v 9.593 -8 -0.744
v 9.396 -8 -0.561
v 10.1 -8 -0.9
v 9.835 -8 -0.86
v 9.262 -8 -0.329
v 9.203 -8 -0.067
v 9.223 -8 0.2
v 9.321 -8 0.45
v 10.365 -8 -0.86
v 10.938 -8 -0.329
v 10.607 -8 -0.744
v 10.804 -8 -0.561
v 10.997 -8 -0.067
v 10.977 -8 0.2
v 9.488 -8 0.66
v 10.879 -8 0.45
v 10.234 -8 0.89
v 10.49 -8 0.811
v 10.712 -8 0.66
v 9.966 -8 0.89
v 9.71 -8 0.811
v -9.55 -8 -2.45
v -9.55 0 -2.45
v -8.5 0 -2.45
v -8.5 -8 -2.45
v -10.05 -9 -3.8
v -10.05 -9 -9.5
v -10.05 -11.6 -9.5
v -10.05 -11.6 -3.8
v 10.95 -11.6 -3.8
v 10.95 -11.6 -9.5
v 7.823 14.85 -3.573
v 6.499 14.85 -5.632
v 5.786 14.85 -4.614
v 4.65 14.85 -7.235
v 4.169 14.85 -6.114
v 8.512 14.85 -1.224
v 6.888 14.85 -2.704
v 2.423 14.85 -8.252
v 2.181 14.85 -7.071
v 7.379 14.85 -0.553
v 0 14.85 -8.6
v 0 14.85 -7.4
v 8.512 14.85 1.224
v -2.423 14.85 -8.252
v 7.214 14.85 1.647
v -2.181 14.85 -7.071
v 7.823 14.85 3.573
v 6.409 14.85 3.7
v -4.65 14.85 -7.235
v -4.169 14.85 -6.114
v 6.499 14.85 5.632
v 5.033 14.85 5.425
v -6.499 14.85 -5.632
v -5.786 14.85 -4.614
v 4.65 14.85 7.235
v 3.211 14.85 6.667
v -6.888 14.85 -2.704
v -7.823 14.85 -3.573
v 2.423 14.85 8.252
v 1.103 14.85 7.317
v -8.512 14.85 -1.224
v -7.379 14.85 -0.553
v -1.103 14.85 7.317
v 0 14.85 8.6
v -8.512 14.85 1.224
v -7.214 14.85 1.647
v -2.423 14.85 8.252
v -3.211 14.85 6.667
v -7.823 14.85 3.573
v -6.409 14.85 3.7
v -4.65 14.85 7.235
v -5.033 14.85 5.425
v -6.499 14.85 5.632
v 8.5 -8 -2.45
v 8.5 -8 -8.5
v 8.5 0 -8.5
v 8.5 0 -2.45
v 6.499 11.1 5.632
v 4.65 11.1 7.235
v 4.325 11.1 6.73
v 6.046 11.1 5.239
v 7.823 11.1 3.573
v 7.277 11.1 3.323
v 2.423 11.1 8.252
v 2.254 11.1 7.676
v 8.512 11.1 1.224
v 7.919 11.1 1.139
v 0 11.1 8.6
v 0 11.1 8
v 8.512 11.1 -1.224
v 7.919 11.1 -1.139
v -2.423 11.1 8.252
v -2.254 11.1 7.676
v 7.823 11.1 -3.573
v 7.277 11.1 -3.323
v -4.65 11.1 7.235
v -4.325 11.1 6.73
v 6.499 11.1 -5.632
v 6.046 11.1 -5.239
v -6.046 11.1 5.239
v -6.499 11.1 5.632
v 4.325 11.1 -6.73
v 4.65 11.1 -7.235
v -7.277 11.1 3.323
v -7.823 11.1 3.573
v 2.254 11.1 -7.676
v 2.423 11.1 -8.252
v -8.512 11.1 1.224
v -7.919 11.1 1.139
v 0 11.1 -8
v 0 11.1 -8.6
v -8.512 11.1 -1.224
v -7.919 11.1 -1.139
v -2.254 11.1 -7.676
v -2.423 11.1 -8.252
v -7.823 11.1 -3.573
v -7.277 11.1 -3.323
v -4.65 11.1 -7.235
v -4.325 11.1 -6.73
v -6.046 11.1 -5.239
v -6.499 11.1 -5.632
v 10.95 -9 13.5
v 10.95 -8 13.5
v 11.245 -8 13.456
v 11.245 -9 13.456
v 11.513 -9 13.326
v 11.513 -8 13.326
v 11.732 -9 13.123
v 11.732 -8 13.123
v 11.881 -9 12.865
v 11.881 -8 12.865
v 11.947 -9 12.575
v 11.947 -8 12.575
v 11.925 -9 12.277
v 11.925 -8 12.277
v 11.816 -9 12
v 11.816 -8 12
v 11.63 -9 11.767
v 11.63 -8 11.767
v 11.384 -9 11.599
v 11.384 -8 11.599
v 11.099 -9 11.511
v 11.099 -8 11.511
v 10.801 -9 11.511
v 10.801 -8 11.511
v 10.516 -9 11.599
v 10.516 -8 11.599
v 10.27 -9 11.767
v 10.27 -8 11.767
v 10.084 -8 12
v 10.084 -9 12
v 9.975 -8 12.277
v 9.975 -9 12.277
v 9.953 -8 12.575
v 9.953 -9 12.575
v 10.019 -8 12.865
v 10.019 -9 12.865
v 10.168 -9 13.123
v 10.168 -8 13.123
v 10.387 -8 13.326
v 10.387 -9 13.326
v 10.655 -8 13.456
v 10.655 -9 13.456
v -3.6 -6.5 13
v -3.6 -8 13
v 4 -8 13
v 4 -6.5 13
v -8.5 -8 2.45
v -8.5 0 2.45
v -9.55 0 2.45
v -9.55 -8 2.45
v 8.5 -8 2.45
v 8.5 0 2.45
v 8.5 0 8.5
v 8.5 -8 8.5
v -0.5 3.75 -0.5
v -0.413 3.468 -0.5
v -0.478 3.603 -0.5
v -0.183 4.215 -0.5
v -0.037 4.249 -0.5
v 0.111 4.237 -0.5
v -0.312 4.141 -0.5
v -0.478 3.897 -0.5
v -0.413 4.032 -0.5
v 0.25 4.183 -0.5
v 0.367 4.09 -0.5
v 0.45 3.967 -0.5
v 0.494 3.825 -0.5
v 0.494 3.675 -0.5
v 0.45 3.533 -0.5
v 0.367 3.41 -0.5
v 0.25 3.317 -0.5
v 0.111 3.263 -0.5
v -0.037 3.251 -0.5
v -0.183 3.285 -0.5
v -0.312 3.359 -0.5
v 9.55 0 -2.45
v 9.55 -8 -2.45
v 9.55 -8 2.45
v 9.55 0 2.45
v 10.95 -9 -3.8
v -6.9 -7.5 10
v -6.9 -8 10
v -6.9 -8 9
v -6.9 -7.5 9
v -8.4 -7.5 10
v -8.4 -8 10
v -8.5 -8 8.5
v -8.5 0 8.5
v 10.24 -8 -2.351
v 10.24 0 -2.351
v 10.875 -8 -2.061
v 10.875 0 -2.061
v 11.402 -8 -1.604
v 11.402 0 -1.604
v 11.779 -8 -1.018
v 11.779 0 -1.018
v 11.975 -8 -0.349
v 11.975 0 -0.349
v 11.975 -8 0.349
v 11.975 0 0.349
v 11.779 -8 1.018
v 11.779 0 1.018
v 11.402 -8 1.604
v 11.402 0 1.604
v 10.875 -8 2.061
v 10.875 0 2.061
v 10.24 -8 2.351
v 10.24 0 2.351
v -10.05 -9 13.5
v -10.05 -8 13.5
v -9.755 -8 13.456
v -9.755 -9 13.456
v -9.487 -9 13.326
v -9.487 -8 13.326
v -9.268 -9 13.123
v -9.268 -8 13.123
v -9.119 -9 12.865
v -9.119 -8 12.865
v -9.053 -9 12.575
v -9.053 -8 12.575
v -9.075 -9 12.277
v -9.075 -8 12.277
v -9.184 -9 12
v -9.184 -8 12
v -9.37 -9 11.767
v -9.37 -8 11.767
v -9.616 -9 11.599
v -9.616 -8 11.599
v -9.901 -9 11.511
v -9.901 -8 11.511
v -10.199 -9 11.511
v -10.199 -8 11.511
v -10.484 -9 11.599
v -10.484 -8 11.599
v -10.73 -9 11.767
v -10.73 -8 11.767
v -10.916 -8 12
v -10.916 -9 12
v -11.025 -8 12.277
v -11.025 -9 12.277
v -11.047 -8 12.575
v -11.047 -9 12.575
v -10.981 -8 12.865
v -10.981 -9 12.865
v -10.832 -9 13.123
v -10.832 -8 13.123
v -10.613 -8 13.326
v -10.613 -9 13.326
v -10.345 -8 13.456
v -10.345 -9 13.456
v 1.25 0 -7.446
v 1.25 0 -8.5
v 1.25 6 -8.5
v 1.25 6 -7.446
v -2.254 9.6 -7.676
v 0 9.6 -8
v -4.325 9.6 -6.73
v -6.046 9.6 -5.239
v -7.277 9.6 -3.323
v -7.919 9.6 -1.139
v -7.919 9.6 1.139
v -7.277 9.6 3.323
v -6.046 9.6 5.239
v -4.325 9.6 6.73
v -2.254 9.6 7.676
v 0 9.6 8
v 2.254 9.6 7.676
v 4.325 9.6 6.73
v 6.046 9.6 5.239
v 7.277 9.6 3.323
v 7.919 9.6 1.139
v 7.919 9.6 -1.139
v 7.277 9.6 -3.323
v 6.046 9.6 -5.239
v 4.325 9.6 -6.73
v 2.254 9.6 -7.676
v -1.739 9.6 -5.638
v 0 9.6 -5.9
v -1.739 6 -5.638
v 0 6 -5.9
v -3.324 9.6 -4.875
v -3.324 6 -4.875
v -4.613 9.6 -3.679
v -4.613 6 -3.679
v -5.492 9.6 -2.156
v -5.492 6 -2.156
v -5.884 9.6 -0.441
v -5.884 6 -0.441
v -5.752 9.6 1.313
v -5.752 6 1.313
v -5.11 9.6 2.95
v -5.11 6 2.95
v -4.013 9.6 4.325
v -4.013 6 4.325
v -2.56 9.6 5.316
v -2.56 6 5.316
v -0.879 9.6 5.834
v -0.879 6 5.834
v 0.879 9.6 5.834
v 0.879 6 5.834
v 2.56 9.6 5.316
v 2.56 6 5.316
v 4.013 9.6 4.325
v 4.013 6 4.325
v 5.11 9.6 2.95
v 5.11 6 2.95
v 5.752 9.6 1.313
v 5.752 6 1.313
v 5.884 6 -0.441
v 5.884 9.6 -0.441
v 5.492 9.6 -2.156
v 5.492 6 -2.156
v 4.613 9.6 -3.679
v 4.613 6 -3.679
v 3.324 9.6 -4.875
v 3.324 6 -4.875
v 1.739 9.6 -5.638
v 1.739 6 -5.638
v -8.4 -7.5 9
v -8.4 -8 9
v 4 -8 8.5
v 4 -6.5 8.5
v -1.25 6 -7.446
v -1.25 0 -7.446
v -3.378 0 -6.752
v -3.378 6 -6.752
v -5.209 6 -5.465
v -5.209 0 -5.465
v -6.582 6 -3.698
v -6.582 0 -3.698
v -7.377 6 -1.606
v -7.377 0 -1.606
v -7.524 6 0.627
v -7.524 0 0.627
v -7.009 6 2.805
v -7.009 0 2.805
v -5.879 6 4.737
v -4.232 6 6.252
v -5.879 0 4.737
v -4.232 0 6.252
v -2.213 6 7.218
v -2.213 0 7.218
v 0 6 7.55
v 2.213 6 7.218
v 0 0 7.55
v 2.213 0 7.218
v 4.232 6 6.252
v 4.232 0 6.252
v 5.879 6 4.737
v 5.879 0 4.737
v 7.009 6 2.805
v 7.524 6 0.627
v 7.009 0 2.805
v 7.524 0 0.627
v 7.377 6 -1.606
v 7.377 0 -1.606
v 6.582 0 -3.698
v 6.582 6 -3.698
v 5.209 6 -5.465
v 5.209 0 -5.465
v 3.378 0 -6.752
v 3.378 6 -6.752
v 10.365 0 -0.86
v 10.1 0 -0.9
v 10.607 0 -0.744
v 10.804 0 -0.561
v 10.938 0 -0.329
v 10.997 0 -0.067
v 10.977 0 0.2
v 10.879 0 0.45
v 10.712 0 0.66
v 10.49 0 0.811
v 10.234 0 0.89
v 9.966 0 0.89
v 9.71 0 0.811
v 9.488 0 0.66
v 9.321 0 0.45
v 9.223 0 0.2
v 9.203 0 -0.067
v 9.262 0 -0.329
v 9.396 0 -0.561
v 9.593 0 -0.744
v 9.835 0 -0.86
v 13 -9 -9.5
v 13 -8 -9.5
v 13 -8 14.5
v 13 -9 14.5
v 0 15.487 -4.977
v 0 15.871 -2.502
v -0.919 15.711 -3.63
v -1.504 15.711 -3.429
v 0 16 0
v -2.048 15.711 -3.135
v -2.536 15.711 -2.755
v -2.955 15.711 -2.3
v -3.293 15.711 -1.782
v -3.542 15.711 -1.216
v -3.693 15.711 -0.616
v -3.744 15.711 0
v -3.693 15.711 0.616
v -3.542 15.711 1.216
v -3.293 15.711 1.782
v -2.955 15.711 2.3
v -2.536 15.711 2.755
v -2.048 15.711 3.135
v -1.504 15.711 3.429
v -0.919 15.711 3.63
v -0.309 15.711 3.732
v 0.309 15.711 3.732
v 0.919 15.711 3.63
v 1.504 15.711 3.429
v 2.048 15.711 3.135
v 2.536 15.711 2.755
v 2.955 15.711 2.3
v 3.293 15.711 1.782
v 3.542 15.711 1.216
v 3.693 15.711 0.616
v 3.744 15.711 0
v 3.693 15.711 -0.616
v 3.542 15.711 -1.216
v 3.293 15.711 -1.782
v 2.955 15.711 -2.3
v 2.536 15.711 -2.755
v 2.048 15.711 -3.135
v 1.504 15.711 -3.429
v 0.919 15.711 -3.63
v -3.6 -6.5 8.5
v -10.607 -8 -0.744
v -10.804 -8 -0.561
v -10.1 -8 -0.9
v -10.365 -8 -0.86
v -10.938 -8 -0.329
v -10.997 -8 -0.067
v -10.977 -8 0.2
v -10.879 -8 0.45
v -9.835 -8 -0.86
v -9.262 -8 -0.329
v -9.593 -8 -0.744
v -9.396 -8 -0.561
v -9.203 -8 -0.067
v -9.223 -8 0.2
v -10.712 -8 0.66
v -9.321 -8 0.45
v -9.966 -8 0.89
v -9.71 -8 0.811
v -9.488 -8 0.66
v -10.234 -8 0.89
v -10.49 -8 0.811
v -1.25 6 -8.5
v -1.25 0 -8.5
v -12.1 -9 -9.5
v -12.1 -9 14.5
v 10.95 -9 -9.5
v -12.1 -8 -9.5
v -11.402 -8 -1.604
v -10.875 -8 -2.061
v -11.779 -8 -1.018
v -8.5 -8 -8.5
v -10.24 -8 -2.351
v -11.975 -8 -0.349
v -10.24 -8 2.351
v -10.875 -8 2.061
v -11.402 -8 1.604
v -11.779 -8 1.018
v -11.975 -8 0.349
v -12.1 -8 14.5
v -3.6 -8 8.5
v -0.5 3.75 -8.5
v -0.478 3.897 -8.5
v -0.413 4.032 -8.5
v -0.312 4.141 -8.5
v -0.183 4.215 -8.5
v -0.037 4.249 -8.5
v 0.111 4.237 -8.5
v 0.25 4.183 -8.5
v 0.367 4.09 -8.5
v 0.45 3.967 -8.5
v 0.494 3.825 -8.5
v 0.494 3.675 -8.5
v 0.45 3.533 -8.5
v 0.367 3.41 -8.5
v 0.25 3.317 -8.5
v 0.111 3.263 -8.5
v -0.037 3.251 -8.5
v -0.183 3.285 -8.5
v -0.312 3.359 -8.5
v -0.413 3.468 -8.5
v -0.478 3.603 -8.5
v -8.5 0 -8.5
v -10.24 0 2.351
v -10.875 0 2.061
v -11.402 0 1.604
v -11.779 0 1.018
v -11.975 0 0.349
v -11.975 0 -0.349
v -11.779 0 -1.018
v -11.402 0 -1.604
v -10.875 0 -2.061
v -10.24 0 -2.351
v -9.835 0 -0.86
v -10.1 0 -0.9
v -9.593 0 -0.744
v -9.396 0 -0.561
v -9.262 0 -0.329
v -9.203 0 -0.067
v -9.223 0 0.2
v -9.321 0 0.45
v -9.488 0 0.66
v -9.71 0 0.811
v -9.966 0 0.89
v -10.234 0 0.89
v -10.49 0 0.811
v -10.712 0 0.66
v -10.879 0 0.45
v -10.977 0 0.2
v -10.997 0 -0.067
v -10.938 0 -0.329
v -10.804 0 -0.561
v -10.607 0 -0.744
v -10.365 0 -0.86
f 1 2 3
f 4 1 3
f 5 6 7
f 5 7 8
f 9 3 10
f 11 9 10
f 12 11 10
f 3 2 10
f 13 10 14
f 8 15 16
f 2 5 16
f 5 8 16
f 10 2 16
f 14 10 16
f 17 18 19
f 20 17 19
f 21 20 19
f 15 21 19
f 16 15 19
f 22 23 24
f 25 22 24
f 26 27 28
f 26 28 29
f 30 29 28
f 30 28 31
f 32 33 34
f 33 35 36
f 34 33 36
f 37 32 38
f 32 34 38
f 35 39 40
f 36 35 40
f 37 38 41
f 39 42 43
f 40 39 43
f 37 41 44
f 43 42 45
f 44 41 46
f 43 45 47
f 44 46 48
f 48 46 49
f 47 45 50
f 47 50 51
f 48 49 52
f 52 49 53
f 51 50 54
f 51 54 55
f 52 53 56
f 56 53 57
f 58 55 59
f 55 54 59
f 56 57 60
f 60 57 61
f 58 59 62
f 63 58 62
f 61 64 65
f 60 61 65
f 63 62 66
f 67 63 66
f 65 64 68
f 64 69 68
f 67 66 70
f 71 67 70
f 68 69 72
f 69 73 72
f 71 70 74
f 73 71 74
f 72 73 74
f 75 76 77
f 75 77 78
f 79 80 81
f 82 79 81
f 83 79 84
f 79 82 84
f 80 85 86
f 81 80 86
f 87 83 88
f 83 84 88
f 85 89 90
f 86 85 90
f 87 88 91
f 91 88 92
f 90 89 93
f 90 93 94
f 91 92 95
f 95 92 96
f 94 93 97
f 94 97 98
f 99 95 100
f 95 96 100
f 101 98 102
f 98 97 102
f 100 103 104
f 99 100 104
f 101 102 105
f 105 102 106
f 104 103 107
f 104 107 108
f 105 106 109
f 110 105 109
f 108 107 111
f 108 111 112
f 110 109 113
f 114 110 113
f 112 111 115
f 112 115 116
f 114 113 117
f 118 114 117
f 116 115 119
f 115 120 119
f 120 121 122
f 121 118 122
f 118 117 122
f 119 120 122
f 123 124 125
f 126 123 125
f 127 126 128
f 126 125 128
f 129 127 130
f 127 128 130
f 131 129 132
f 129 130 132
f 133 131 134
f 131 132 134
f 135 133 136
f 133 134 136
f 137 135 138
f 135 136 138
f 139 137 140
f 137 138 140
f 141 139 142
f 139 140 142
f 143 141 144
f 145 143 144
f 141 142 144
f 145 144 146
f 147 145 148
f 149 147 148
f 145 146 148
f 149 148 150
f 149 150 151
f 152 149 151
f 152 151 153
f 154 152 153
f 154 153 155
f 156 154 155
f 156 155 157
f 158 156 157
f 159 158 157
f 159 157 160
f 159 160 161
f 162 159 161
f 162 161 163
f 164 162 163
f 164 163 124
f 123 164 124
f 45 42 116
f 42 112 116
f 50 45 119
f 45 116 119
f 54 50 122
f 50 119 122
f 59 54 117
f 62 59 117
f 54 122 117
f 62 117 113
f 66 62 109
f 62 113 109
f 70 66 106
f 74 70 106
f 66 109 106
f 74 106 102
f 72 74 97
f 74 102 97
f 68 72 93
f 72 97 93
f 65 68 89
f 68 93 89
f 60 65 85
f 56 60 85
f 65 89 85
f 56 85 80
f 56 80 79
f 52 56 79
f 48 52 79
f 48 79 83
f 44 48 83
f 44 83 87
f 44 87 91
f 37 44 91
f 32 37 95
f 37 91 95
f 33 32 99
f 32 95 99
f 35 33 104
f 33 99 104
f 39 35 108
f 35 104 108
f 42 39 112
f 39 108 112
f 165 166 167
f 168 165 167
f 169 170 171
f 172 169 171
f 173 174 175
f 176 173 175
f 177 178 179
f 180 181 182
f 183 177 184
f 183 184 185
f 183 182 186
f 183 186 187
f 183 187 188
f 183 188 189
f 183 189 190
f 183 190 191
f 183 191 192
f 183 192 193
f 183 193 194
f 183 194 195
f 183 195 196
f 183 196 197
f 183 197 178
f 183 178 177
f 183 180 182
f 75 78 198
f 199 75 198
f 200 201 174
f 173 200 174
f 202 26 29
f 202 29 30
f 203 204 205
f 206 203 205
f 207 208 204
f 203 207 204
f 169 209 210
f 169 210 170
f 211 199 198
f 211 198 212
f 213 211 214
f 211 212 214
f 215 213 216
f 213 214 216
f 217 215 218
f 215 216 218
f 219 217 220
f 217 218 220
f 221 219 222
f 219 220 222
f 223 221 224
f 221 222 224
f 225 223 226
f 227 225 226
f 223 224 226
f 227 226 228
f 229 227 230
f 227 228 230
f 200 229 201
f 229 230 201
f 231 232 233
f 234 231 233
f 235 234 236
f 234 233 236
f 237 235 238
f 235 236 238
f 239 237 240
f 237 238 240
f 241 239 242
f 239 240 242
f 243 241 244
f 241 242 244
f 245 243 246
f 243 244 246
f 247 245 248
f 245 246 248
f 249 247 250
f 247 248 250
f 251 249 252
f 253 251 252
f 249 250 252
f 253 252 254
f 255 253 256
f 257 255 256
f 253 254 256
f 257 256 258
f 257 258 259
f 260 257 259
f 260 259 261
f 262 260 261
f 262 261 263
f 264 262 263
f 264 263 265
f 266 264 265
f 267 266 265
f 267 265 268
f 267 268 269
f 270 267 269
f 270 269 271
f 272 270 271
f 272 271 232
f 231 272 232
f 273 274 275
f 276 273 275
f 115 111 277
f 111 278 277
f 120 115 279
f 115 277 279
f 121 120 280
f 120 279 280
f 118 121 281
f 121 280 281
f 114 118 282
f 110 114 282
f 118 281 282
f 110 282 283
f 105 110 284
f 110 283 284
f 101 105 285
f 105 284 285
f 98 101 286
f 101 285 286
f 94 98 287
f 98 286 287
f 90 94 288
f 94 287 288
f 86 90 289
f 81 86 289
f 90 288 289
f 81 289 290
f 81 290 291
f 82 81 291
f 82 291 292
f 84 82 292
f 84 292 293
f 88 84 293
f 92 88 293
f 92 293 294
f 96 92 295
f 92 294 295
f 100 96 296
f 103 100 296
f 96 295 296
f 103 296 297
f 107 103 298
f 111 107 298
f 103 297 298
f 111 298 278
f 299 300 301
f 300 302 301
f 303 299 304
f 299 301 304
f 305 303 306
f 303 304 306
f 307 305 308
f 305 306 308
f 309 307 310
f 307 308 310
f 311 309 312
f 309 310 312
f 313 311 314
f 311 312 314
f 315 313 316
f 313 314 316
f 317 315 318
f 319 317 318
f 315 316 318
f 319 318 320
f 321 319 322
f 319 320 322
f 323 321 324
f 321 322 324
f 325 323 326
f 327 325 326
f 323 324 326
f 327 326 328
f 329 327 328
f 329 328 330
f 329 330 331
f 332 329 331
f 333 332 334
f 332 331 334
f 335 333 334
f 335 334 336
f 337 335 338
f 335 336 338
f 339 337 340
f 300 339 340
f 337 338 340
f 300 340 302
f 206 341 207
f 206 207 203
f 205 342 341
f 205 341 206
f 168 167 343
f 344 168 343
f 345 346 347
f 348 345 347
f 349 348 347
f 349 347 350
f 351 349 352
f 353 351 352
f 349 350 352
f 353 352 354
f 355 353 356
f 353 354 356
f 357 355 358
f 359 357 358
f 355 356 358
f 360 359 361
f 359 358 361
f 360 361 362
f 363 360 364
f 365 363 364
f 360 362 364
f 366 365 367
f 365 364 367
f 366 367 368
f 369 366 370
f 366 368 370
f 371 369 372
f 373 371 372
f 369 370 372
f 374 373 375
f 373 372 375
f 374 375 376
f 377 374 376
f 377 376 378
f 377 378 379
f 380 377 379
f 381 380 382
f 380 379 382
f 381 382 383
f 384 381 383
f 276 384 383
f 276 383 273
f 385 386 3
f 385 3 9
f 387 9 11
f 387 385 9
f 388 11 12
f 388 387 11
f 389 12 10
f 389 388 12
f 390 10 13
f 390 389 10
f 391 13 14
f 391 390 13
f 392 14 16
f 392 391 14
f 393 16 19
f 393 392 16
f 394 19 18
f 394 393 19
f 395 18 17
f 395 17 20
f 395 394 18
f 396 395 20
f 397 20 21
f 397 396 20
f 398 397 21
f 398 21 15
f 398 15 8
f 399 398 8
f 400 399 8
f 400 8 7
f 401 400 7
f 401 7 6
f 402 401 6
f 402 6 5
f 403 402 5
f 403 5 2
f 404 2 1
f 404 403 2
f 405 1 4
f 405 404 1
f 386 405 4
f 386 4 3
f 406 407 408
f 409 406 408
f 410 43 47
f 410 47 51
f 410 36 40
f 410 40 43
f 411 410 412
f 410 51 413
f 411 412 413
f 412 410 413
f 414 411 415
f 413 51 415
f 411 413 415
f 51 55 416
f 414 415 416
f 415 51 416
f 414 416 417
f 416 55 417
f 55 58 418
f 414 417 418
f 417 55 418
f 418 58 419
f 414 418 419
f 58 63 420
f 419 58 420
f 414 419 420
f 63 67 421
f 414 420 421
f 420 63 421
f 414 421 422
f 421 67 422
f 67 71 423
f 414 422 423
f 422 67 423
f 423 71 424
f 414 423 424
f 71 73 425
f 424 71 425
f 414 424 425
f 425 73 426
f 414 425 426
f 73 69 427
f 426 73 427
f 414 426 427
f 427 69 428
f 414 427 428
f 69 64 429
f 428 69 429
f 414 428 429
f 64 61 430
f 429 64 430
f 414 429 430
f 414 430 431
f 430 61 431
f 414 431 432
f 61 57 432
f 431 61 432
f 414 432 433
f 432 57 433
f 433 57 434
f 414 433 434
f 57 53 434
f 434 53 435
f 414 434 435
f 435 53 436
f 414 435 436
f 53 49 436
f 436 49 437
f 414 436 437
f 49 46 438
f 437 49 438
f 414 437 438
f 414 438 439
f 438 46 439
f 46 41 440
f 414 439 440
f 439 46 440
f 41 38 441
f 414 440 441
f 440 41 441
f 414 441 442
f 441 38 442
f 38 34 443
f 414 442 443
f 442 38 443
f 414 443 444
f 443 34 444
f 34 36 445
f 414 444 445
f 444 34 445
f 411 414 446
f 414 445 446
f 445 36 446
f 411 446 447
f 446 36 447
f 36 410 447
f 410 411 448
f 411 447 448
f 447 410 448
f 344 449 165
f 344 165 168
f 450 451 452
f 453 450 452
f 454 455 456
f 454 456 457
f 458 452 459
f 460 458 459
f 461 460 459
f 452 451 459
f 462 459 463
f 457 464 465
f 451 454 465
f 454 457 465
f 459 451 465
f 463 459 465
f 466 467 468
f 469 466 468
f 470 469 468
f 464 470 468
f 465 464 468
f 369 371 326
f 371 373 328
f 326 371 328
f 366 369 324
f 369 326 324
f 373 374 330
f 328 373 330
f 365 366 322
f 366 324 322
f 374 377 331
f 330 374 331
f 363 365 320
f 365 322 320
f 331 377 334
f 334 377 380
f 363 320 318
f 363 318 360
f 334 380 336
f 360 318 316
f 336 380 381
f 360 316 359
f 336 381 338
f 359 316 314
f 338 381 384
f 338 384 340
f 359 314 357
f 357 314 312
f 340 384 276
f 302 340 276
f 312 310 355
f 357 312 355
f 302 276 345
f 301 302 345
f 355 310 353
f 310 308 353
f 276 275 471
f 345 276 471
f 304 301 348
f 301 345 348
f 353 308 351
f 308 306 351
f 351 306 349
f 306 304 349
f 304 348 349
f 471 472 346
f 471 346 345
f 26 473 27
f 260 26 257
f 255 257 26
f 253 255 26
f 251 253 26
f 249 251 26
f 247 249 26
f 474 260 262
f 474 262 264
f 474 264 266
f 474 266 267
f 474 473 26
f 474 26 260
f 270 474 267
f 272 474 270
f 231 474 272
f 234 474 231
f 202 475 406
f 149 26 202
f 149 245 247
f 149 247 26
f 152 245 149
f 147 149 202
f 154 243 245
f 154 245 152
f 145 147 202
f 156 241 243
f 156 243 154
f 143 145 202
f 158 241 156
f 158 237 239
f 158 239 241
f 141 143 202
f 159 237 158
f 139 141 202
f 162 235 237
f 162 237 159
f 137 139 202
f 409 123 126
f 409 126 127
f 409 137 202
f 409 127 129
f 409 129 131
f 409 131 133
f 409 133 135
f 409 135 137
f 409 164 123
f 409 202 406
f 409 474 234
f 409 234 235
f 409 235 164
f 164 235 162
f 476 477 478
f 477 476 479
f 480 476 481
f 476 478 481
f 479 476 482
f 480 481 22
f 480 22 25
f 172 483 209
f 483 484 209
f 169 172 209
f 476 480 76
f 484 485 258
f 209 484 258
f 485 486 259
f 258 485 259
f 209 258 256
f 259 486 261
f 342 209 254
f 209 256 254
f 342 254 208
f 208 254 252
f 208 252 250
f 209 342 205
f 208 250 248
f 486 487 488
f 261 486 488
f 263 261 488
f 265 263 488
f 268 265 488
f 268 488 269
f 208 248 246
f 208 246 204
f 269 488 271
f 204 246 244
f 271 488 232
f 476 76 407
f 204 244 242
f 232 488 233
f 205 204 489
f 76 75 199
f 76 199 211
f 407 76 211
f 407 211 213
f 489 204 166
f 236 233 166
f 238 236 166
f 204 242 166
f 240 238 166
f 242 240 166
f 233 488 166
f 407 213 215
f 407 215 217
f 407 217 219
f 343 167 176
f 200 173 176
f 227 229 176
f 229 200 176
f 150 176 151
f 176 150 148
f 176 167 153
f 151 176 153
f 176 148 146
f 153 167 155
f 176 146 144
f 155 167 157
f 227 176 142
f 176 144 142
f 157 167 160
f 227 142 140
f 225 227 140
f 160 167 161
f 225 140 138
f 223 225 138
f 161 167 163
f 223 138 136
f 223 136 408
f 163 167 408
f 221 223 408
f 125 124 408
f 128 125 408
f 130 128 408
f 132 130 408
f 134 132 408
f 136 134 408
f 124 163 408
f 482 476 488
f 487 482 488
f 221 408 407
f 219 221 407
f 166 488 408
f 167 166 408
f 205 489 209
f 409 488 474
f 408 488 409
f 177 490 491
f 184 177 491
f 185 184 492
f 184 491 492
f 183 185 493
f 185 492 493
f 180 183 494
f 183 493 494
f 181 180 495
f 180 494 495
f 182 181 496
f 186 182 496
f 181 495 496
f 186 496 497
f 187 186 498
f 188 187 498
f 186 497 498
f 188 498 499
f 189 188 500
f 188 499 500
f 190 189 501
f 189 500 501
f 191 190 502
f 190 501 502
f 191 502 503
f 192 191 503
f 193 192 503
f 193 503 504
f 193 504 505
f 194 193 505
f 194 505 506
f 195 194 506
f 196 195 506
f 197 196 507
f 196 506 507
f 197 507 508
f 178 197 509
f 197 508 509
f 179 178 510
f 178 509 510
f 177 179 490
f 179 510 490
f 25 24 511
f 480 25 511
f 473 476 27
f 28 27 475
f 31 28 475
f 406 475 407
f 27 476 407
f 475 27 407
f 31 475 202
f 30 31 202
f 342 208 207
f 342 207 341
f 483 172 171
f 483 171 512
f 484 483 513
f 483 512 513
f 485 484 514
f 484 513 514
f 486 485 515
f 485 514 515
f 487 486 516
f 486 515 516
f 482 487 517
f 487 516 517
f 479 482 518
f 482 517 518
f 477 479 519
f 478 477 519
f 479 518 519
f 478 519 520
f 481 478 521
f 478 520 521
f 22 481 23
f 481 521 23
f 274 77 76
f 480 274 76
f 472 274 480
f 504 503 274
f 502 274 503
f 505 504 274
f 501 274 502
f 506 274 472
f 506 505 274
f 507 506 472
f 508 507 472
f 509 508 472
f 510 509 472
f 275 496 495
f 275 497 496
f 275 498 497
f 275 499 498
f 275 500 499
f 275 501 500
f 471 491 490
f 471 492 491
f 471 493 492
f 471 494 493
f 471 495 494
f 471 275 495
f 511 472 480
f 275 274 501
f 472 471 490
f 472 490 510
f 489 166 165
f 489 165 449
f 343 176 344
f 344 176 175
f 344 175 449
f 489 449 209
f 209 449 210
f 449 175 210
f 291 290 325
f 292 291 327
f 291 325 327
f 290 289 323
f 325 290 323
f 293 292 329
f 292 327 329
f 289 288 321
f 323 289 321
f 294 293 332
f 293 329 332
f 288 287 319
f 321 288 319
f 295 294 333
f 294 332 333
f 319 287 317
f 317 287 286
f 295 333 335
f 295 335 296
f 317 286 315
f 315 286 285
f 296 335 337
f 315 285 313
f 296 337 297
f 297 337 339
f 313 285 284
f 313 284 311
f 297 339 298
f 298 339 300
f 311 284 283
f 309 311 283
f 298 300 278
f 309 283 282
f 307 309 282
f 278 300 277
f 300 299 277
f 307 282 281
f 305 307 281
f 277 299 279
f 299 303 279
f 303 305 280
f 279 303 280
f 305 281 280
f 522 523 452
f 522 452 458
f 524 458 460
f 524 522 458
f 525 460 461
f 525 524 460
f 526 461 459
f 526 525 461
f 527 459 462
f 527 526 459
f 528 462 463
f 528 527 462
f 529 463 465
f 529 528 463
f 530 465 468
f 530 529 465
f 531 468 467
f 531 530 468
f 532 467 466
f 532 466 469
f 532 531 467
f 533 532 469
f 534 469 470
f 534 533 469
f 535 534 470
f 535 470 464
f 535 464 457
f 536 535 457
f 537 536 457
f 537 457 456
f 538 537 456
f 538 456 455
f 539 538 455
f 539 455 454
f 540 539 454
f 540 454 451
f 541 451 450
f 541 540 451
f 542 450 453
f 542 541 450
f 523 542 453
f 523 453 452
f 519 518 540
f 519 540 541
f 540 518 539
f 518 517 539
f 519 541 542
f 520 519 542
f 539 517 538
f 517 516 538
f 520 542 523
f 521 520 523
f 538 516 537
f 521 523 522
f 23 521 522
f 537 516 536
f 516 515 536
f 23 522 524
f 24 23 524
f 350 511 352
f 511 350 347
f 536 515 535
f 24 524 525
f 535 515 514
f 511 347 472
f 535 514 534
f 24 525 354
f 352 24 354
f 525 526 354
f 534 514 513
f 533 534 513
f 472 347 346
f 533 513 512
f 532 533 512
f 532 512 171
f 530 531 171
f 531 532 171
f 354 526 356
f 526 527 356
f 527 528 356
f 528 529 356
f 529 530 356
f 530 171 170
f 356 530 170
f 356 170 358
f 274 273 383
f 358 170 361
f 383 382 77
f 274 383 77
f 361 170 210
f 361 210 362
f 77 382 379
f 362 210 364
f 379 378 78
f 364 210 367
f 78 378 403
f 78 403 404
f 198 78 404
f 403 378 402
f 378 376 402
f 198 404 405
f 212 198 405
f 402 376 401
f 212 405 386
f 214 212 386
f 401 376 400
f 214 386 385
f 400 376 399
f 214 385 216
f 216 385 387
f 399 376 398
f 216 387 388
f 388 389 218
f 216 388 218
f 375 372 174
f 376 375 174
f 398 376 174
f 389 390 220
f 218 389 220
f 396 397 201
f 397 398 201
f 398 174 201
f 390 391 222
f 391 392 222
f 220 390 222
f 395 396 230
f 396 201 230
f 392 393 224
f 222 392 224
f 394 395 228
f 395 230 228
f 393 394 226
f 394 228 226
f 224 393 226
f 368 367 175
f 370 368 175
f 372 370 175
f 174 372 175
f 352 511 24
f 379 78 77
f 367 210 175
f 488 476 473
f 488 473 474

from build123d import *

# Parameters (mm, degrees)
SKETCH2_R                = 0.9
BOSS_EXTRUDE1_DEPTH      = 8
BOSS_EXTRUDE2_REACH      = 28.314
BOSS_EXTRUDE2_END_RADIUS = 7.55
SKETCH3_W                = 2.5
SKETCH3_H                = 6
SKETCH4_R                = 0.5
CUT_EXTRUDE1_DEPTH       = 8
SKETCH5_W                = 25.1
SKETCH5_H                = 24
BOSS_EXTRUDE3_DEPTH      = 1
SKETCH6_W                = 7.6
SKETCH6_H                = 4.5
BOSS_EXTRUDE4_DEPTH      = 1.5
SKETCH7_R                = 1
CUT_EXTRUDE2_DEPTH       = 31.907118921
SKETCH8_W                = 1.5
SKETCH8_H                = 1
BOSS_EXTRUDE5_DEPTH      = 0.5
SKETCH9_W                = 21
SKETCH9_H                = 5.7
BOSS_EXTRUDE6_DEPTH      = 2.6


with BuildPart() as part:
    # Sketch1 → Revolve1 (revolve)
    with BuildSketch(Plane(origin=(0, 0, 0), x_dir=(0, 0, -1), z_dir=(1, 0, 0))):
        with BuildLine():
            Line((0, 0), (0, 16))
            ThreePointArc((0, 16), (3.744412504, 15.710784808), (7.4, 14.85))
            Line((7.4, 14.85), (8.6, 14.85))
            Line((8.6, 14.85), (8.6, 11.1))
            Line((8.6, 11.1), (8, 11.1))
            Line((8, 11.1), (8, 9.6))
            Line((8, 9.6), (5.9, 9.6))
            Line((5.9, 9.6), (5.9, 6))
            Line((5.9, 6), (7.55, 6))
            Line((7.55, 6), (7.55, 0))
            Line((7.55, 0), (0, 0))
        make_face()
    revolve(axis=Axis((0, 0, 0), (0, 1, 0)))

    # Sketch2 → Boss-Extrude1 (add)
    with BuildSketch(Plane.XZ):
        with BuildLine():
            Line((-8.5, -8.5), (8.5, -8.5))
            Line((8.5, -8.5), (8.5, -2.45))
            Line((8.5, -2.45), (9.55, -2.45))
            ThreePointArc((9.55, -2.45), (12, 0), (9.55, 2.45))
            Line((9.55, 2.45), (8.5, 2.45))
            Line((8.5, 2.45), (8.5, 8.5))
            Line((8.5, 8.5), (-8.5, 8.5))
            Line((-8.5, 8.5), (-8.5, 2.45))
            Line((-8.5, 2.45), (-9.55, 2.45))
            ThreePointArc((-9.55, 2.45), (-12, 0), (-9.55, -2.45))
            Line((-9.55, -2.45), (-8.5, -2.45))
            Line((-8.5, -2.45), (-8.5, -8.5))
        make_face()
        with Locations(Location((-10.1, 0, 0), (0, 0, 270))):
            Circle(SKETCH2_R, mode=Mode.SUBTRACT)
        with Locations(Location((10.1, 0, 0), (0, 0, 270))):
            Circle(SKETCH2_R, mode=Mode.SUBTRACT)
    extrude(amount=BOSS_EXTRUDE1_DEPTH)

    # Boss-Extrude2: up to this cylinder (the profile starts outside it)
    boss_extrude2_end = Plane(origin=(0, 3, 0), z_dir=(0, -1, 0)) * Cylinder(BOSS_EXTRUDE2_END_RADIUS, 72.728, mode=Mode.PRIVATE)
    # Sketch3 → Boss-Extrude2 (add, up to the surface)
    with BuildSketch(Plane(origin=(0, 0, -8.5), x_dir=(-1, 0, 0), z_dir=(0, 0, -1)), mode=Mode.PRIVATE) as boss_extrude2_sk1:
        with Locations((0, 3)):
            Rectangle(SKETCH3_W, SKETCH3_H)
    boss_extrude2_tool1 = extrude(boss_extrude2_sk1.sketch, amount=-BOSS_EXTRUDE2_REACH, mode=Mode.PRIVATE) - boss_extrude2_end
    add(boss_extrude2_tool1.solids().sort_by_distance((0, 3, -8.5))[0])

    # Sketch4 → Cut-Extrude1 (cut)
    with BuildSketch(Plane(origin=(0, 0, -8.5), x_dir=(-1, 0, 0), z_dir=(0, 0, -1))):
        with Locations((0, 3.75)):
            Circle(SKETCH4_R)
    extrude(amount=-CUT_EXTRUDE1_DEPTH, mode=Mode.SUBTRACT)

    # Sketch5 → Boss-Extrude3 (add)
    with BuildSketch(Plane.XZ.offset(8)):
        with Locations((0.45, 2.5)):
            Rectangle(SKETCH5_W, SKETCH5_H)
    extrude(amount=BOSS_EXTRUDE3_DEPTH)

    # Sketch6 → Boss-Extrude4 (add)
    with BuildSketch(Plane(origin=(0, -8, 0), x_dir=(1, 0, 0), z_dir=(0, 1, 0))):
        with Locations((0.2, -10.75)):
            Rectangle(SKETCH6_W, SKETCH6_H)
    extrude(amount=BOSS_EXTRUDE4_DEPTH)

    # Sketch7 → Cut-Extrude2 (cut, through all)
    with BuildSketch(Plane(origin=(0, -8, 0), x_dir=(1, 0, 0), z_dir=(0, 1, 0))):
        with Locations(Location((-10.05, -12.5, 0), (0, 0, 270))):
            Circle(SKETCH7_R)
        with Locations(Location((10.95, -12.5, 0), (0, 0, 270))):
            Circle(SKETCH7_R)
    extrude(amount=-CUT_EXTRUDE2_DEPTH, mode=Mode.SUBTRACT)

    # Sketch8 → Boss-Extrude5 (add)
    with BuildSketch(Plane(origin=(0, -8, 0), x_dir=(1, 0, 0), z_dir=(0, 1, 0))):
        with Locations((-7.65, -9.5)):
            Rectangle(SKETCH8_W, SKETCH8_H)
    extrude(amount=BOSS_EXTRUDE5_DEPTH)

    # Sketch9 → Boss-Extrude6 (add)
    with BuildSketch(Plane.XZ.offset(9)):
        with Locations((0.45, -6.65)):
            Rectangle(SKETCH9_W, SKETCH9_H)
    extrude(amount=BOSS_EXTRUDE6_DEPTH)


solid = part.part
